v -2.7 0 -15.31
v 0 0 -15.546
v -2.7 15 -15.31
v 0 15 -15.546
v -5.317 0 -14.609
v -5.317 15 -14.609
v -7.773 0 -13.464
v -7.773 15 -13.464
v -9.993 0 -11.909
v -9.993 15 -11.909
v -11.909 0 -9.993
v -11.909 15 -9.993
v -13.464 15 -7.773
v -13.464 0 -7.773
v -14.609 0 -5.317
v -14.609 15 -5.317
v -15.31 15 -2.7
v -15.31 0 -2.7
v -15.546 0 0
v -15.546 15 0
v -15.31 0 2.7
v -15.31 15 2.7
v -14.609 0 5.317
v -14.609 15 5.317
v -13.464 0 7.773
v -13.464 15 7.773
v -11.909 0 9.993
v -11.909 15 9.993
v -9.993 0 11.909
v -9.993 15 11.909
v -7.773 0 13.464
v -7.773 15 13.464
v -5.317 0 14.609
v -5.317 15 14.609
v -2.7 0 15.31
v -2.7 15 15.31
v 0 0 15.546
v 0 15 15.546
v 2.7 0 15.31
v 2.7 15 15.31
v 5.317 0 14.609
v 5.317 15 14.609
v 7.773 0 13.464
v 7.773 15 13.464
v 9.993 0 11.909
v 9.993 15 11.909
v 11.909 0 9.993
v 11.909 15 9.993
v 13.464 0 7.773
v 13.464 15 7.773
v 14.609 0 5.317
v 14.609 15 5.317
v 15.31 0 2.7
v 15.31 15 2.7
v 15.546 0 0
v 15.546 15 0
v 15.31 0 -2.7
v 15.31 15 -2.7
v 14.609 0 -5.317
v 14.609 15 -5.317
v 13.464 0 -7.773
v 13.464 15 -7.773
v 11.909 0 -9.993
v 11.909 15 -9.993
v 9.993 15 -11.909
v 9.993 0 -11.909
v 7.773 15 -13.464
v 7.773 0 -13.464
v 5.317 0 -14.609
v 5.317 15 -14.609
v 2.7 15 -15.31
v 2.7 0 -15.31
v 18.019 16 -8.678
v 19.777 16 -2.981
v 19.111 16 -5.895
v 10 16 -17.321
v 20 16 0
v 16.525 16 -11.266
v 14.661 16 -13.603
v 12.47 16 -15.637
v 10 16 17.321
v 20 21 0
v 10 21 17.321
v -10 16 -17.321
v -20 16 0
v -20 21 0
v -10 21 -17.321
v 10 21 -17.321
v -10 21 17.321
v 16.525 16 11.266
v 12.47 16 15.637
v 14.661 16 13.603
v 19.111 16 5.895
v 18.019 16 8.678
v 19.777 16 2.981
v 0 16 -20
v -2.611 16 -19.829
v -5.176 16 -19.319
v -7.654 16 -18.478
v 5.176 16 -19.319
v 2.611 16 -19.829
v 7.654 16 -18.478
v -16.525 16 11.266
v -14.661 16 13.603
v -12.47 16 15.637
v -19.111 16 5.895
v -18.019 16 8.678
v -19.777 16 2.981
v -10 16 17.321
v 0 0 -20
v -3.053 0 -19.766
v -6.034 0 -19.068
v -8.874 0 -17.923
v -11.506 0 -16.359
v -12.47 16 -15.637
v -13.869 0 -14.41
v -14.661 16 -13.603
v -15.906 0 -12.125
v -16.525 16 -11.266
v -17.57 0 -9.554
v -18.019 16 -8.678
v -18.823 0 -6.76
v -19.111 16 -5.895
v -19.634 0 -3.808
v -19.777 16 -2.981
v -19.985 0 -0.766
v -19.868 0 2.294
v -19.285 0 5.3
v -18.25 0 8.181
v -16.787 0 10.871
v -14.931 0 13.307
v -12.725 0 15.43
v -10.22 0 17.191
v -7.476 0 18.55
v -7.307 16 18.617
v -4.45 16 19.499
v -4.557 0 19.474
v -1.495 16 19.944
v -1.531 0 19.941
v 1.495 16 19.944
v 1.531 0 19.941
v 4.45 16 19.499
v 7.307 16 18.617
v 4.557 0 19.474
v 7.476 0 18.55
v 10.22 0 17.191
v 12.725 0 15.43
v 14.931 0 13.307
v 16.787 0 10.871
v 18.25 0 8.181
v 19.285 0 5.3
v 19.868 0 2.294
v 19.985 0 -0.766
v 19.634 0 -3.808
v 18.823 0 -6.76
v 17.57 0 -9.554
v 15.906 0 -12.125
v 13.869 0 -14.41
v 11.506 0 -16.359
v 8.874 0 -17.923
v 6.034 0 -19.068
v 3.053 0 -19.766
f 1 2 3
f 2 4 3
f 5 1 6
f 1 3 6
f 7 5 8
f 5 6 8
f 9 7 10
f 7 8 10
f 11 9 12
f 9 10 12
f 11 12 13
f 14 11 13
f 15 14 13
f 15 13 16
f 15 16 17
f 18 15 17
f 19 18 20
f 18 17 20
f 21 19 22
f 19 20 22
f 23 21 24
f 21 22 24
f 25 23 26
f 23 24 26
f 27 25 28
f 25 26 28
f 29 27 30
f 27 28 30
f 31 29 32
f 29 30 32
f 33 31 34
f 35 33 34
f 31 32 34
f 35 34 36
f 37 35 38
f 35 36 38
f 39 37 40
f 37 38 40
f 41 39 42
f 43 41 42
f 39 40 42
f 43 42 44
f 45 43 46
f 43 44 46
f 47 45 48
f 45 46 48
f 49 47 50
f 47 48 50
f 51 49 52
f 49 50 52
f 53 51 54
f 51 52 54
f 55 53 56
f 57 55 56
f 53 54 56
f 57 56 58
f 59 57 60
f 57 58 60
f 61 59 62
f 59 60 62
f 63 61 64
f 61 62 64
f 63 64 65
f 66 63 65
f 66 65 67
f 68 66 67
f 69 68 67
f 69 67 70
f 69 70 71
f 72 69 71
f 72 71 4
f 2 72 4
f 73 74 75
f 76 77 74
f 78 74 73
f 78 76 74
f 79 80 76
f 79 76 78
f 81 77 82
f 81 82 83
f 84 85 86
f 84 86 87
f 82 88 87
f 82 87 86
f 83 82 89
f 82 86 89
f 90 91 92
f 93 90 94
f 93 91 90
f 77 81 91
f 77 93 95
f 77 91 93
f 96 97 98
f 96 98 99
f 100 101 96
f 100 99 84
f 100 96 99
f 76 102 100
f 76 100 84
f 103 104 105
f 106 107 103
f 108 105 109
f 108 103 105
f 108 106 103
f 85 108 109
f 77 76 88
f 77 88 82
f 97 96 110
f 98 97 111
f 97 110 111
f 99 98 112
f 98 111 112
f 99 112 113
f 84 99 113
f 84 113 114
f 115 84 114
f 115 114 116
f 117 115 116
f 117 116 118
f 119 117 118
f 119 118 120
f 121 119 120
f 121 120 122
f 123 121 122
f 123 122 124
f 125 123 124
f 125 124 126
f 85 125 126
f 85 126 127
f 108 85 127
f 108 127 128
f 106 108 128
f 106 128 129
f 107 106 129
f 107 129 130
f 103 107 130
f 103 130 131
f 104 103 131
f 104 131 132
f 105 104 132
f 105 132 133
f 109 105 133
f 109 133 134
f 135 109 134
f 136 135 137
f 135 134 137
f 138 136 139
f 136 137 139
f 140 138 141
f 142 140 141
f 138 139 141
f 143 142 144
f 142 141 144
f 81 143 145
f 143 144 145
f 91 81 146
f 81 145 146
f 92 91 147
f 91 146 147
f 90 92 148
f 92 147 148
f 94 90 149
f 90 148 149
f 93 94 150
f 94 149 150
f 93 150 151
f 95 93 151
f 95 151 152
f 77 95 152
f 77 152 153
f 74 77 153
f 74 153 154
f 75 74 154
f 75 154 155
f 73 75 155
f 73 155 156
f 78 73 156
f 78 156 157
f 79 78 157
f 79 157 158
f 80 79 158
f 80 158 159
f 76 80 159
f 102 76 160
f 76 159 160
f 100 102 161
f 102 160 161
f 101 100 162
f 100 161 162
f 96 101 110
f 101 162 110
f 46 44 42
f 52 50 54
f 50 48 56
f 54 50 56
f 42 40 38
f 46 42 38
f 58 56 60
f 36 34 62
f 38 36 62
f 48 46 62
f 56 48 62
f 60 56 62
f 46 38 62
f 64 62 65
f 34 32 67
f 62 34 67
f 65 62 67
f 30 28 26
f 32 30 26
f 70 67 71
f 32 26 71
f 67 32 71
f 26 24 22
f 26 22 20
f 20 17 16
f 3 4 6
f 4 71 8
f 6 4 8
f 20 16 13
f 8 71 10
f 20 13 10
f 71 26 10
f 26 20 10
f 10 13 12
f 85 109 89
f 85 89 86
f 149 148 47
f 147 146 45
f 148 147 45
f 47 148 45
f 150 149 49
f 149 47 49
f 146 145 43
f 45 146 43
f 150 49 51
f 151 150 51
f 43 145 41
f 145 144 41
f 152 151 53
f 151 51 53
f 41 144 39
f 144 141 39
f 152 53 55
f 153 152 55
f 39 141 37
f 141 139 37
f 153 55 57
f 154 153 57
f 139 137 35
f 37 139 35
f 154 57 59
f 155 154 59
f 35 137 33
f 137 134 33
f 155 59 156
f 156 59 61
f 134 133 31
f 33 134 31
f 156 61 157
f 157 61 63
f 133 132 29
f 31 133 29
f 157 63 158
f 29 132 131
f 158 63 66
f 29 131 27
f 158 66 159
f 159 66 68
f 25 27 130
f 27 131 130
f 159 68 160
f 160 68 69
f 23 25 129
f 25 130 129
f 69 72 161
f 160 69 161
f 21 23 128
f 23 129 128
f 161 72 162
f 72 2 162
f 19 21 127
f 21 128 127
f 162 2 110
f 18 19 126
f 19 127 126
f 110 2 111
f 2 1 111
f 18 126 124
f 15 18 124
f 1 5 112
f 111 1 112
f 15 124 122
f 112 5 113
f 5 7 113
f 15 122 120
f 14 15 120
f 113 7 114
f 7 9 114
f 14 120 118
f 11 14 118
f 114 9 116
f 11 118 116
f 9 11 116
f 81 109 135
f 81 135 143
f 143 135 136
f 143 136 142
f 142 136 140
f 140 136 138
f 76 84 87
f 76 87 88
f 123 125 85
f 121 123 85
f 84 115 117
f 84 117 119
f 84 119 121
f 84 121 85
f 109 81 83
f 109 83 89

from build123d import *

# Parameters (mm, degrees)
TAGLIO_ESTRUSIONE1_START = -5
TAGLIO_ESTRUSIONE1_DEPTH = 5


with BuildPart() as part:
    # Schizzo1 → Rivoluzione1 (revolve)
    with BuildSketch(Plane.XY, mode=Mode.PRIVATE) as rivoluzione1_sk:
        Polygon((-15.5465, 0), (-15.5465, 15), (0, 15), (0, 21), (-20, 21), (-20, 0), align=None)
    revolve(rivoluzione1_sk.sketch.rotate(Axis((0, 0, 0), (0, 1, 0)), 270), axis=Axis((0, 0, 0), (0, 1, 0)))

    # Schizzo2 → Taglio-Estrusione1 (cut)
    with BuildSketch(Plane(origin=(0, 21, 0), x_dir=(1, 0, 0), z_dir=(0, 1, 0)).offset(TAGLIO_ESTRUSIONE1_START)):
        with BuildLine():
            Line((-20, 0), (-10, 17.320508076))
            ThreePointArc((-10, 17.320508076), (-17.320508076, 10), (-20, 0))
        make_face()
        with BuildLine():
            Line((-10, -17.320508076), (-20, 0))
            ThreePointArc((-20, 0), (-17.320508076, -10), (-10, -17.320508076))
        make_face()
        with BuildLine():
            Line((10, -17.320508076), (-10, -17.320508076))
            ThreePointArc((-10, -17.320508076), (0, -20), (10, -17.320508076))
        make_face()
        with BuildLine():
            ThreePointArc((10, -17.320508076), (17.320508076, -10), (20, 0))
            Line((20, 0), (10, -17.320508076))
        make_face()
        with BuildLine():
            ThreePointArc((20, 0), (17.320508076, 10), (10, 17.320508076))
            Line((10, 17.320508076), (20, 0))
        make_face()
        with BuildLine():
            ThreePointArc((10, 17.320508076), (0, 20), (-10, 17.320508076))
            Line((-10, 17.320508076), (10, 17.320508076))
        make_face()
    extrude(amount=TAGLIO_ESTRUSIONE1_DEPTH, mode=Mode.SUBTRACT)


solid = part.part
